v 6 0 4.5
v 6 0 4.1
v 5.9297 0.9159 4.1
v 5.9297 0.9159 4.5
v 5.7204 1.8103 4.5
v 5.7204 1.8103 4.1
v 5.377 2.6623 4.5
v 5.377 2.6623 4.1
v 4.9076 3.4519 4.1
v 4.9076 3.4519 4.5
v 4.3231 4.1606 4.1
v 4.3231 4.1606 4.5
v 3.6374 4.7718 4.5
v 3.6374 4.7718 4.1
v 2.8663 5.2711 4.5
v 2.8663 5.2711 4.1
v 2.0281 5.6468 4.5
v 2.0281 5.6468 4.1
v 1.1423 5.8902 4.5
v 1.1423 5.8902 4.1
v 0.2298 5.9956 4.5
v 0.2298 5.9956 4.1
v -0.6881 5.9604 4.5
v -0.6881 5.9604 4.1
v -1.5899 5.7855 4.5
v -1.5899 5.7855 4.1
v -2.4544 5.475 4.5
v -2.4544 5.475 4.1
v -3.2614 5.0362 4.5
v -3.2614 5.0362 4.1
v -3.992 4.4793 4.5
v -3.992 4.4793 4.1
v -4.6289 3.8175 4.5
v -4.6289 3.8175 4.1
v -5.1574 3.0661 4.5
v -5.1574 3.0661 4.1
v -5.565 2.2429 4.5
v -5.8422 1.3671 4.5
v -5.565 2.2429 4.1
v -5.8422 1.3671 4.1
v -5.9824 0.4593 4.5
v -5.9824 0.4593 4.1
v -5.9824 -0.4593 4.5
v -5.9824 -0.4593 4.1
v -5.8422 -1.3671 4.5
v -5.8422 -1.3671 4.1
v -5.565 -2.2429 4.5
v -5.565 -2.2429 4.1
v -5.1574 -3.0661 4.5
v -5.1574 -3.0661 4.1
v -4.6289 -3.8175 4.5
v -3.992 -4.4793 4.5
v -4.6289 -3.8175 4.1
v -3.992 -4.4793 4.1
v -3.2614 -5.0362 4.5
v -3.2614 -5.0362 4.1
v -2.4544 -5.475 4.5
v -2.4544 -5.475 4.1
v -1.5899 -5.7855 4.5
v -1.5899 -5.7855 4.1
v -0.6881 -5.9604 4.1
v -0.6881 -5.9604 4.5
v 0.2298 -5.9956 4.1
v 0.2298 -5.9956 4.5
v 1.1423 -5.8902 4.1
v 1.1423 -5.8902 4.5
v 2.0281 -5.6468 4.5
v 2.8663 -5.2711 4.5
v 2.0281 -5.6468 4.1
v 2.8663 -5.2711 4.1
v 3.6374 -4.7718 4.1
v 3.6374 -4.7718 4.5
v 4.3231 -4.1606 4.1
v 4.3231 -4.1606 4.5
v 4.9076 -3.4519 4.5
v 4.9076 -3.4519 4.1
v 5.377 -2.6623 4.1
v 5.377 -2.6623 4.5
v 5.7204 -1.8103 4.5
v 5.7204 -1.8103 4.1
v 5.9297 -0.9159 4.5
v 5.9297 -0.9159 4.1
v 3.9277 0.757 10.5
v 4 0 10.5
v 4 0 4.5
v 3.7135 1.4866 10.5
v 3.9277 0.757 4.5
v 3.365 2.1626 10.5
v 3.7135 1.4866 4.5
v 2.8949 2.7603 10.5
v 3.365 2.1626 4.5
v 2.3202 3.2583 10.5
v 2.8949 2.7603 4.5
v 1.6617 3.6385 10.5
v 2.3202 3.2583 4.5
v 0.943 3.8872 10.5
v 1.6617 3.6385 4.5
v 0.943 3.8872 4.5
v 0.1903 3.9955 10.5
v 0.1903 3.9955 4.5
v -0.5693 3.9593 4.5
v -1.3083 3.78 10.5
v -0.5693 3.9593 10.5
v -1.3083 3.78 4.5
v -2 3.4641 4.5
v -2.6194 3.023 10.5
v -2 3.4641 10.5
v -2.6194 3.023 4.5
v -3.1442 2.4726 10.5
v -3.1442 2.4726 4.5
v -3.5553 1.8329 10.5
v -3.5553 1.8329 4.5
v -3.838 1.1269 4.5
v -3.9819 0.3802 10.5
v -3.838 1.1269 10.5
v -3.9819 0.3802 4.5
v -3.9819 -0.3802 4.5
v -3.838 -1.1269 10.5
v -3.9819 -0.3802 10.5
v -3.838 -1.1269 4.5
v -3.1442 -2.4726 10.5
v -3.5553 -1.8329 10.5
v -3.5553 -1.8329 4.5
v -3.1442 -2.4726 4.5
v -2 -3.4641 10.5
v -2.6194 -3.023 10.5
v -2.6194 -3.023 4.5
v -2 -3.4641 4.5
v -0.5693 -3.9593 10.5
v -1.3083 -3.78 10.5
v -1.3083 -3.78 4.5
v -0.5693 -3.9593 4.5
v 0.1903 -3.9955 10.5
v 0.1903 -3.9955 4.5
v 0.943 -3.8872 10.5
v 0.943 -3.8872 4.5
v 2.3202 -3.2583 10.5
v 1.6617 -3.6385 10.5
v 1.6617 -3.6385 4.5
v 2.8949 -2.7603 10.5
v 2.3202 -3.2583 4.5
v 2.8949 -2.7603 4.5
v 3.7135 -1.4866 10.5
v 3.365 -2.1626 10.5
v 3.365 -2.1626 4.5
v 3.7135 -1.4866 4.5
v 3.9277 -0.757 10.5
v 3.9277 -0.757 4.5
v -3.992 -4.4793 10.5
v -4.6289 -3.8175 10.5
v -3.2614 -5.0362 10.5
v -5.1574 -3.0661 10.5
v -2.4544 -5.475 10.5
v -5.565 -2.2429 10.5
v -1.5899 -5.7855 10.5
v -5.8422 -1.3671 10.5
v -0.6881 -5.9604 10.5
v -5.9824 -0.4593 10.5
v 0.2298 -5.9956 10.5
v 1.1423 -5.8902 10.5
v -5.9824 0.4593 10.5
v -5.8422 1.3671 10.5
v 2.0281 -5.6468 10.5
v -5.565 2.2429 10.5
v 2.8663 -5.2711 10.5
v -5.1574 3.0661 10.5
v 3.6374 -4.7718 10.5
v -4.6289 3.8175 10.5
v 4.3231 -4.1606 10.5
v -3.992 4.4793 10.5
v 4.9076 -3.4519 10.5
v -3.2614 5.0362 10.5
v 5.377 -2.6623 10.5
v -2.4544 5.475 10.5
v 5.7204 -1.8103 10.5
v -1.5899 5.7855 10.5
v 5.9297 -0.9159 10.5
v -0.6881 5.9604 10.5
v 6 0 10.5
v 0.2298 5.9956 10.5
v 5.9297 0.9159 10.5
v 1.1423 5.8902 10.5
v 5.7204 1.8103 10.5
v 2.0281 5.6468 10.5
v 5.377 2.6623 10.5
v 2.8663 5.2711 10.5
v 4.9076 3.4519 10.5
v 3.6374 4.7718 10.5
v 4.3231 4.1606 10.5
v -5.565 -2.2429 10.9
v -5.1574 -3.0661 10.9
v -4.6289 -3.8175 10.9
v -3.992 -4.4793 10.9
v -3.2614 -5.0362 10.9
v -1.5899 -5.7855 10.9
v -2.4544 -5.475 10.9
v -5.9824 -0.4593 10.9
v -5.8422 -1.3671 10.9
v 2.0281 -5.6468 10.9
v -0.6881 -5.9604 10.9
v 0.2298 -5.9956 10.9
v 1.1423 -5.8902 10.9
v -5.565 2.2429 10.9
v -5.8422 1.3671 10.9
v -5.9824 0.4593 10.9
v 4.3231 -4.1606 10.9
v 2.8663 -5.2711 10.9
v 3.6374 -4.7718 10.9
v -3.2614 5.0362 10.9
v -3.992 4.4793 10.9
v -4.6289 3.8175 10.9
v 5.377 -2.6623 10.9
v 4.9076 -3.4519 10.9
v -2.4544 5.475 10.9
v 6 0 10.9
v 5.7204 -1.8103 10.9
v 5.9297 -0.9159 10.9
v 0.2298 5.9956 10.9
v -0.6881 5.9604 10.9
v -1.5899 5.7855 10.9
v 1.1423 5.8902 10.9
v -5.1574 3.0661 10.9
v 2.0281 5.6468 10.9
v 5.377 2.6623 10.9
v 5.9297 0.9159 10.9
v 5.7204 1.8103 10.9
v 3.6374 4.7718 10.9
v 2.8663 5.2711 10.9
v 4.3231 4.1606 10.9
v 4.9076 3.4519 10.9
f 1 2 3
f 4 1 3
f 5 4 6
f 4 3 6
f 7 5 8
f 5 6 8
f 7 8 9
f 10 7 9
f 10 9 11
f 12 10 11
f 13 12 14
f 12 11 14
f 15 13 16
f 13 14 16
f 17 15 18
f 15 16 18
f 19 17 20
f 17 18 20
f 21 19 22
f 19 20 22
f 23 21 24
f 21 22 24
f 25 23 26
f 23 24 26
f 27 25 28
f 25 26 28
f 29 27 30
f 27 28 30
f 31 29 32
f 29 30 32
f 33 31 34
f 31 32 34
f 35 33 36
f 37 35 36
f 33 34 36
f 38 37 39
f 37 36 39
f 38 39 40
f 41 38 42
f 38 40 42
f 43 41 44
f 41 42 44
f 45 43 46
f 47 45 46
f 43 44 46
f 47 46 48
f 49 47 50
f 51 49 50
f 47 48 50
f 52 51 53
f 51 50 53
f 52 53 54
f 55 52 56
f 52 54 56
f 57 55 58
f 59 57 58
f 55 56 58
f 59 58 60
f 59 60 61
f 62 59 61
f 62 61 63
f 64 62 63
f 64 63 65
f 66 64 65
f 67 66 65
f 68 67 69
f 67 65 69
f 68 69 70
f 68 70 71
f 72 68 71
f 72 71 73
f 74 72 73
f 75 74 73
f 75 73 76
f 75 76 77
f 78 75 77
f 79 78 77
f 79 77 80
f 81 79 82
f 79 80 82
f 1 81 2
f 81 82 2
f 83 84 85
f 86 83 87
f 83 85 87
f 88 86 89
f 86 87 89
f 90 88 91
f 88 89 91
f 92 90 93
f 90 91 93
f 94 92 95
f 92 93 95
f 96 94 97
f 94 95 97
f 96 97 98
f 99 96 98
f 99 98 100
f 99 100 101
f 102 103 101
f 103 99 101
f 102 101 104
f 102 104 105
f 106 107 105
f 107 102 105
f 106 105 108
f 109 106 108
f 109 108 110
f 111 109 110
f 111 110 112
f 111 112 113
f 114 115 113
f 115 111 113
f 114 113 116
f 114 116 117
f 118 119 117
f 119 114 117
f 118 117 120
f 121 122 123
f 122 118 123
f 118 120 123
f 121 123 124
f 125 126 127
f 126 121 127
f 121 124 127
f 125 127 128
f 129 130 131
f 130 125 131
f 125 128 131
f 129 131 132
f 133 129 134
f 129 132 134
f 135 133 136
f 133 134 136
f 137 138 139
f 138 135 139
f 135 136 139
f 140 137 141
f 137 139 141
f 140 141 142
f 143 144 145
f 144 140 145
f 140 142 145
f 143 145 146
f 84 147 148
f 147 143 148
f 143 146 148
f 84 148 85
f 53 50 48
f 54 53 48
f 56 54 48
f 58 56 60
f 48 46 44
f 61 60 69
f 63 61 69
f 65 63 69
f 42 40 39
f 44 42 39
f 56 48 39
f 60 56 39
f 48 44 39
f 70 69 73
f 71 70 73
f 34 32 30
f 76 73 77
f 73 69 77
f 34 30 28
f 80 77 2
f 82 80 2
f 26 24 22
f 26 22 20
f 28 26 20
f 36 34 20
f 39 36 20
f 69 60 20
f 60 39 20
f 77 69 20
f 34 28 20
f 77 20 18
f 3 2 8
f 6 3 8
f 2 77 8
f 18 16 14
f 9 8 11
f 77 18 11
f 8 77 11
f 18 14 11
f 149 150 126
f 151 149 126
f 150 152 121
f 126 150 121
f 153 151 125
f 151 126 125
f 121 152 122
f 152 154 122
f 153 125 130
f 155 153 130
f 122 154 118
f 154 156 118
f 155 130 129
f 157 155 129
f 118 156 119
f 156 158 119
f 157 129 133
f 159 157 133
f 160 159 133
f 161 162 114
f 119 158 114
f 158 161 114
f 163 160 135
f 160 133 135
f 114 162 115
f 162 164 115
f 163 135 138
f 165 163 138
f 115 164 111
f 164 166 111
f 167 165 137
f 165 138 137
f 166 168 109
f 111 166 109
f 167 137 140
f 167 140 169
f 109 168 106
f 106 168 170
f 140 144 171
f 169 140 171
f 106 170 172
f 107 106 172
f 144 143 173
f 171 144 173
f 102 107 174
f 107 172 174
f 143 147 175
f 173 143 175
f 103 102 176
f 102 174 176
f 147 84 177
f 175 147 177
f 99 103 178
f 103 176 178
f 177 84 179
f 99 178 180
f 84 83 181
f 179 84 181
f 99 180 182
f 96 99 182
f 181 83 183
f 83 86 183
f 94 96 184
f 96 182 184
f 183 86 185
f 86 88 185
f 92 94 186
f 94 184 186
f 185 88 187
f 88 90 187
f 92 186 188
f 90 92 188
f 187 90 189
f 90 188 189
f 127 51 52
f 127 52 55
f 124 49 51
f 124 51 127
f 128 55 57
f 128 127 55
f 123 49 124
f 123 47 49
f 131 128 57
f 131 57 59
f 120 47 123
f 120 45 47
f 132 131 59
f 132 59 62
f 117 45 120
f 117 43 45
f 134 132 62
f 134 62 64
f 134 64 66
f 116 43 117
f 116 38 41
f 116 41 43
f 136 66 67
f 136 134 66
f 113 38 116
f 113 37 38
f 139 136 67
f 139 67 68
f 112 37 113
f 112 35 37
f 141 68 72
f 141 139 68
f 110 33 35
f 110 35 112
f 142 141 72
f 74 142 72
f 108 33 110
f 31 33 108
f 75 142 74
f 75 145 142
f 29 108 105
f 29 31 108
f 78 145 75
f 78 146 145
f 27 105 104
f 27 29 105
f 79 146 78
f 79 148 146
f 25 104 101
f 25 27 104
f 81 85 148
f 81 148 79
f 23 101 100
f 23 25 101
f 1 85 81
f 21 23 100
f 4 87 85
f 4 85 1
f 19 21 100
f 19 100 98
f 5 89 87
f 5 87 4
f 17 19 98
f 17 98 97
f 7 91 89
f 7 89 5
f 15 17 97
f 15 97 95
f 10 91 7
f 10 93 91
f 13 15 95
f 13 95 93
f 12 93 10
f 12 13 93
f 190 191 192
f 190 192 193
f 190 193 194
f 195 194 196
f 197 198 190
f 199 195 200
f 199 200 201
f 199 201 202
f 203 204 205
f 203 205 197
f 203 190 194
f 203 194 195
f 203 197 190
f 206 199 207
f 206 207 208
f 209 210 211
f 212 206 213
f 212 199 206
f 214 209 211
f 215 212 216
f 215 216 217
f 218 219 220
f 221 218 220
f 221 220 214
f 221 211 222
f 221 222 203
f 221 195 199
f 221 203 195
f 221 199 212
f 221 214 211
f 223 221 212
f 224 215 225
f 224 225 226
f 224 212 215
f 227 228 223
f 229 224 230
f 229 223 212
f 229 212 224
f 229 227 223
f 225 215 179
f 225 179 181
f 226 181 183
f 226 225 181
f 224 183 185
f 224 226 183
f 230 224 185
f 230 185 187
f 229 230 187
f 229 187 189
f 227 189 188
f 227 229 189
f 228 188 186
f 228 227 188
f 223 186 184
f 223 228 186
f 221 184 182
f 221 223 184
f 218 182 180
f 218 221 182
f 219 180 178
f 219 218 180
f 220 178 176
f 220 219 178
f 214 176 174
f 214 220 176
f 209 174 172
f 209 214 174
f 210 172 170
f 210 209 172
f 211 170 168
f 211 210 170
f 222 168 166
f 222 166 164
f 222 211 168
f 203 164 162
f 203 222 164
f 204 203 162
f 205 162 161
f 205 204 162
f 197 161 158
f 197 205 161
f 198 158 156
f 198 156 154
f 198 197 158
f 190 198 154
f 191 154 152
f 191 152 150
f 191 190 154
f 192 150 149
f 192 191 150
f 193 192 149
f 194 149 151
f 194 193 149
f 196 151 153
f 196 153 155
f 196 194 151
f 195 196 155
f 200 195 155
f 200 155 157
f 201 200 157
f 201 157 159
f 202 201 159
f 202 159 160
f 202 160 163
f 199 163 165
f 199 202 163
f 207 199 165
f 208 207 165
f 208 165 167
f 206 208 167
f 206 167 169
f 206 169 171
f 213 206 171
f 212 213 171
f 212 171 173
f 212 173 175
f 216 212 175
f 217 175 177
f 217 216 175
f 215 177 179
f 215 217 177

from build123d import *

# Parameters (mm, degrees)
SKETCH1_R           = 10
BOSS_EXTRUDE1_DEPTH = 16
SKETCH2_R           = 15
BOSS_EXTRUDE2_DEPTH = 1
SCALE1_SCALE        = 0.2
SCALE2_SCALE        = 2


with BuildPart() as part:
    # Sketch1 → Boss-Extrude1 (new body)
    with BuildSketch(Plane.XY):
        Circle(SKETCH1_R)
    extrude(amount=BOSS_EXTRUDE1_DEPTH)

    # Sketch2 → Boss-Extrude2 (add)
    with BuildSketch(Plane.XY.offset(16)):
        Circle(SKETCH2_R)
    boss_extrude2 = extrude(amount=-BOSS_EXTRUDE2_DEPTH)

    # Mirror1: Boss-Extrude2 across plane
    add(boss_extrude2.mirror(Plane(origin=(0, 0, 7.5), x_dir=(1, 0, 0), z_dir=(0, 0, -1))))


with BuildPart() as part_1:
    # Scale1: scaled about (0, 0, 7.5)
    add(part.part.scale(SCALE1_SCALE).moved(Location((0, 0, 6))))


with BuildPart() as part_2:
    # Scale2: scaled about (0, 0, 7.5)
    add(part_1.part.scale(SCALE2_SCALE).moved(Location((0, 0, -7.5))))


solid = part_2.part
